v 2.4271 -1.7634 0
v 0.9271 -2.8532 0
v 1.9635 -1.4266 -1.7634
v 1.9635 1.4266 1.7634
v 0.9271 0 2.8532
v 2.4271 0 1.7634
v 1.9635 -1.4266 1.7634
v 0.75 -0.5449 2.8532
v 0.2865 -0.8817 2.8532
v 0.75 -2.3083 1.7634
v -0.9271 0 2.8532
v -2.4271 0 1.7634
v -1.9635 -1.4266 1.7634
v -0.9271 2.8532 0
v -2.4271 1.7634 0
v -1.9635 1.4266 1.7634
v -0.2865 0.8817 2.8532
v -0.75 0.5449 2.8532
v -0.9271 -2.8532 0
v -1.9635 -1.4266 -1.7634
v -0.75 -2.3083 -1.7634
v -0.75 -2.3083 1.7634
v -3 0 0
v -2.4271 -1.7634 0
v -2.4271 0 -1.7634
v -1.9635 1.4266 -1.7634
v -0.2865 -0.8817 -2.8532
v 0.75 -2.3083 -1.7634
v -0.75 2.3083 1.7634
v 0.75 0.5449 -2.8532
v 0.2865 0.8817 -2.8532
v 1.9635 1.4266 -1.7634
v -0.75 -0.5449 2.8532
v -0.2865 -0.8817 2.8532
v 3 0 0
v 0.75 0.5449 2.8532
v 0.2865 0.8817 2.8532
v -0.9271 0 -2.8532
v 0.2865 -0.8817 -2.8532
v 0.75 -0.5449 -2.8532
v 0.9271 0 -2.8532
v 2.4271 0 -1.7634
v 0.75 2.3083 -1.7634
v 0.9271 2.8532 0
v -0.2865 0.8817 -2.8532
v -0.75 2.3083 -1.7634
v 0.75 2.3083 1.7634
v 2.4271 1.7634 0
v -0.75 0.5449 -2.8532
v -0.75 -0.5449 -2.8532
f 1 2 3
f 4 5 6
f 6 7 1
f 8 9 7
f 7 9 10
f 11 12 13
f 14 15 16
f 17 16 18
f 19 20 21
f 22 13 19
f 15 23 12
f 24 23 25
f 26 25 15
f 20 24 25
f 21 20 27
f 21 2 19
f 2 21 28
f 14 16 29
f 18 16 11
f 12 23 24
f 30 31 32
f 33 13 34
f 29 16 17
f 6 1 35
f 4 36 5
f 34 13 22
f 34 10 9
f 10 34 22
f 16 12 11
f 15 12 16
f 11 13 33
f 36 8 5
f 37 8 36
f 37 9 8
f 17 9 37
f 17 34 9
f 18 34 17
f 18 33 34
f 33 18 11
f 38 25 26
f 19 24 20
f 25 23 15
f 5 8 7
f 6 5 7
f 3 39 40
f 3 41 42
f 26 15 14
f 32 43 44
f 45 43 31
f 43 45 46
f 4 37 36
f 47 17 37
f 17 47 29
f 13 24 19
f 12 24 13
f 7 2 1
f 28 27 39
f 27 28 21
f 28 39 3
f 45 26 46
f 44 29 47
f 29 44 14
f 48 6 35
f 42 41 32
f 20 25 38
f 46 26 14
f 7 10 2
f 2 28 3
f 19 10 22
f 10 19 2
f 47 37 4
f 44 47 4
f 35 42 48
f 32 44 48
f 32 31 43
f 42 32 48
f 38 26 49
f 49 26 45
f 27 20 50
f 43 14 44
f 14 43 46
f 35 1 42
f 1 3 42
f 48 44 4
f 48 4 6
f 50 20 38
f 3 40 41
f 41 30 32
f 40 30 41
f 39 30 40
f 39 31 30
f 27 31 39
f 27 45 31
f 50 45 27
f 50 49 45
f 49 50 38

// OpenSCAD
p=make_points(100);
K=Kmeans(p,round(rnd(20,20)),3);
K2=Kmeans(p,round(rnd(20,20)),3);
//for(i=[0:len(p)-1])translate(p[i])sphere(0.5);  
//for(i=[0: max(0,len(K[0])-1)])translate(K[0][i])color("Red",0.5)sphere(2,$fn=20);


for(i=[0: max(0,len(K[1])-1)]){
    color([rnd(),rnd(),rnd()] )hull(){
    for(j=[0: max(0,len(K[1][i])-1)])translate(K[1][i][j])sphere( 3  );}}
for(i=[0: max(0,len(K2[1])-1)]){
    color([rnd(),rnd(),rnd()] )hull(){
    for(j=[0: max(0,len(K2[1][i])-1)])translate(K2[1][i][j])sphere( 3  );}}

function Kmeans(v,K,c=5,inmeans=undef) =  len(v) < K ? [v,v] :
let(
maxlenv= max(0,len(v)-1),maxK=max(0,K-1),
means=inmeans==undef? /* Initailize means if not done */    [for(i=[0:maxlenv])
        (v[rnd(maxlenv)]+v[rnd(maxlenv)]+v[rnd(maxlenv)])/3]:inmeans, 
vbuckets=[for(i=[0:maxlenv])index_min([for(k=[0:maxK])norm(v[i]-means[k])])],
new_means=[for(k=[0:maxK]) mean([for(i=[0:maxlenv]) if(vbuckets[i]==k)v[i]])]   )
c>0? Kmeans(v,K,c-1,new_means):
let(inbuckets=[for(k=[0:maxK])[for(i=[0:maxlenv]) if(vbuckets[i]==k)v[i]] ])
[new_means,inbuckets] ;


function index_min(l) = search(min(l), l)[0];
function index_max(l) = search(max(l), l)[0];
function mean(a) = !(len(a) > 0) ?  undef :   ([ for(b=a) 1 ] * a )/len(a);
function make_points(j=10)= ([for(i=[0:j])[rnd(-60,60),rnd(-20,20),rnd(-10,10)]]);
function rnd(a = 1, b = 0, s = [] ) = 
  s == [] ? 
   (rands(min(a, b), max(   a, b), 1)[0]) 
  : 
   (rands(min(a, b), max(a, b), 1, s)[0])
  ; 
